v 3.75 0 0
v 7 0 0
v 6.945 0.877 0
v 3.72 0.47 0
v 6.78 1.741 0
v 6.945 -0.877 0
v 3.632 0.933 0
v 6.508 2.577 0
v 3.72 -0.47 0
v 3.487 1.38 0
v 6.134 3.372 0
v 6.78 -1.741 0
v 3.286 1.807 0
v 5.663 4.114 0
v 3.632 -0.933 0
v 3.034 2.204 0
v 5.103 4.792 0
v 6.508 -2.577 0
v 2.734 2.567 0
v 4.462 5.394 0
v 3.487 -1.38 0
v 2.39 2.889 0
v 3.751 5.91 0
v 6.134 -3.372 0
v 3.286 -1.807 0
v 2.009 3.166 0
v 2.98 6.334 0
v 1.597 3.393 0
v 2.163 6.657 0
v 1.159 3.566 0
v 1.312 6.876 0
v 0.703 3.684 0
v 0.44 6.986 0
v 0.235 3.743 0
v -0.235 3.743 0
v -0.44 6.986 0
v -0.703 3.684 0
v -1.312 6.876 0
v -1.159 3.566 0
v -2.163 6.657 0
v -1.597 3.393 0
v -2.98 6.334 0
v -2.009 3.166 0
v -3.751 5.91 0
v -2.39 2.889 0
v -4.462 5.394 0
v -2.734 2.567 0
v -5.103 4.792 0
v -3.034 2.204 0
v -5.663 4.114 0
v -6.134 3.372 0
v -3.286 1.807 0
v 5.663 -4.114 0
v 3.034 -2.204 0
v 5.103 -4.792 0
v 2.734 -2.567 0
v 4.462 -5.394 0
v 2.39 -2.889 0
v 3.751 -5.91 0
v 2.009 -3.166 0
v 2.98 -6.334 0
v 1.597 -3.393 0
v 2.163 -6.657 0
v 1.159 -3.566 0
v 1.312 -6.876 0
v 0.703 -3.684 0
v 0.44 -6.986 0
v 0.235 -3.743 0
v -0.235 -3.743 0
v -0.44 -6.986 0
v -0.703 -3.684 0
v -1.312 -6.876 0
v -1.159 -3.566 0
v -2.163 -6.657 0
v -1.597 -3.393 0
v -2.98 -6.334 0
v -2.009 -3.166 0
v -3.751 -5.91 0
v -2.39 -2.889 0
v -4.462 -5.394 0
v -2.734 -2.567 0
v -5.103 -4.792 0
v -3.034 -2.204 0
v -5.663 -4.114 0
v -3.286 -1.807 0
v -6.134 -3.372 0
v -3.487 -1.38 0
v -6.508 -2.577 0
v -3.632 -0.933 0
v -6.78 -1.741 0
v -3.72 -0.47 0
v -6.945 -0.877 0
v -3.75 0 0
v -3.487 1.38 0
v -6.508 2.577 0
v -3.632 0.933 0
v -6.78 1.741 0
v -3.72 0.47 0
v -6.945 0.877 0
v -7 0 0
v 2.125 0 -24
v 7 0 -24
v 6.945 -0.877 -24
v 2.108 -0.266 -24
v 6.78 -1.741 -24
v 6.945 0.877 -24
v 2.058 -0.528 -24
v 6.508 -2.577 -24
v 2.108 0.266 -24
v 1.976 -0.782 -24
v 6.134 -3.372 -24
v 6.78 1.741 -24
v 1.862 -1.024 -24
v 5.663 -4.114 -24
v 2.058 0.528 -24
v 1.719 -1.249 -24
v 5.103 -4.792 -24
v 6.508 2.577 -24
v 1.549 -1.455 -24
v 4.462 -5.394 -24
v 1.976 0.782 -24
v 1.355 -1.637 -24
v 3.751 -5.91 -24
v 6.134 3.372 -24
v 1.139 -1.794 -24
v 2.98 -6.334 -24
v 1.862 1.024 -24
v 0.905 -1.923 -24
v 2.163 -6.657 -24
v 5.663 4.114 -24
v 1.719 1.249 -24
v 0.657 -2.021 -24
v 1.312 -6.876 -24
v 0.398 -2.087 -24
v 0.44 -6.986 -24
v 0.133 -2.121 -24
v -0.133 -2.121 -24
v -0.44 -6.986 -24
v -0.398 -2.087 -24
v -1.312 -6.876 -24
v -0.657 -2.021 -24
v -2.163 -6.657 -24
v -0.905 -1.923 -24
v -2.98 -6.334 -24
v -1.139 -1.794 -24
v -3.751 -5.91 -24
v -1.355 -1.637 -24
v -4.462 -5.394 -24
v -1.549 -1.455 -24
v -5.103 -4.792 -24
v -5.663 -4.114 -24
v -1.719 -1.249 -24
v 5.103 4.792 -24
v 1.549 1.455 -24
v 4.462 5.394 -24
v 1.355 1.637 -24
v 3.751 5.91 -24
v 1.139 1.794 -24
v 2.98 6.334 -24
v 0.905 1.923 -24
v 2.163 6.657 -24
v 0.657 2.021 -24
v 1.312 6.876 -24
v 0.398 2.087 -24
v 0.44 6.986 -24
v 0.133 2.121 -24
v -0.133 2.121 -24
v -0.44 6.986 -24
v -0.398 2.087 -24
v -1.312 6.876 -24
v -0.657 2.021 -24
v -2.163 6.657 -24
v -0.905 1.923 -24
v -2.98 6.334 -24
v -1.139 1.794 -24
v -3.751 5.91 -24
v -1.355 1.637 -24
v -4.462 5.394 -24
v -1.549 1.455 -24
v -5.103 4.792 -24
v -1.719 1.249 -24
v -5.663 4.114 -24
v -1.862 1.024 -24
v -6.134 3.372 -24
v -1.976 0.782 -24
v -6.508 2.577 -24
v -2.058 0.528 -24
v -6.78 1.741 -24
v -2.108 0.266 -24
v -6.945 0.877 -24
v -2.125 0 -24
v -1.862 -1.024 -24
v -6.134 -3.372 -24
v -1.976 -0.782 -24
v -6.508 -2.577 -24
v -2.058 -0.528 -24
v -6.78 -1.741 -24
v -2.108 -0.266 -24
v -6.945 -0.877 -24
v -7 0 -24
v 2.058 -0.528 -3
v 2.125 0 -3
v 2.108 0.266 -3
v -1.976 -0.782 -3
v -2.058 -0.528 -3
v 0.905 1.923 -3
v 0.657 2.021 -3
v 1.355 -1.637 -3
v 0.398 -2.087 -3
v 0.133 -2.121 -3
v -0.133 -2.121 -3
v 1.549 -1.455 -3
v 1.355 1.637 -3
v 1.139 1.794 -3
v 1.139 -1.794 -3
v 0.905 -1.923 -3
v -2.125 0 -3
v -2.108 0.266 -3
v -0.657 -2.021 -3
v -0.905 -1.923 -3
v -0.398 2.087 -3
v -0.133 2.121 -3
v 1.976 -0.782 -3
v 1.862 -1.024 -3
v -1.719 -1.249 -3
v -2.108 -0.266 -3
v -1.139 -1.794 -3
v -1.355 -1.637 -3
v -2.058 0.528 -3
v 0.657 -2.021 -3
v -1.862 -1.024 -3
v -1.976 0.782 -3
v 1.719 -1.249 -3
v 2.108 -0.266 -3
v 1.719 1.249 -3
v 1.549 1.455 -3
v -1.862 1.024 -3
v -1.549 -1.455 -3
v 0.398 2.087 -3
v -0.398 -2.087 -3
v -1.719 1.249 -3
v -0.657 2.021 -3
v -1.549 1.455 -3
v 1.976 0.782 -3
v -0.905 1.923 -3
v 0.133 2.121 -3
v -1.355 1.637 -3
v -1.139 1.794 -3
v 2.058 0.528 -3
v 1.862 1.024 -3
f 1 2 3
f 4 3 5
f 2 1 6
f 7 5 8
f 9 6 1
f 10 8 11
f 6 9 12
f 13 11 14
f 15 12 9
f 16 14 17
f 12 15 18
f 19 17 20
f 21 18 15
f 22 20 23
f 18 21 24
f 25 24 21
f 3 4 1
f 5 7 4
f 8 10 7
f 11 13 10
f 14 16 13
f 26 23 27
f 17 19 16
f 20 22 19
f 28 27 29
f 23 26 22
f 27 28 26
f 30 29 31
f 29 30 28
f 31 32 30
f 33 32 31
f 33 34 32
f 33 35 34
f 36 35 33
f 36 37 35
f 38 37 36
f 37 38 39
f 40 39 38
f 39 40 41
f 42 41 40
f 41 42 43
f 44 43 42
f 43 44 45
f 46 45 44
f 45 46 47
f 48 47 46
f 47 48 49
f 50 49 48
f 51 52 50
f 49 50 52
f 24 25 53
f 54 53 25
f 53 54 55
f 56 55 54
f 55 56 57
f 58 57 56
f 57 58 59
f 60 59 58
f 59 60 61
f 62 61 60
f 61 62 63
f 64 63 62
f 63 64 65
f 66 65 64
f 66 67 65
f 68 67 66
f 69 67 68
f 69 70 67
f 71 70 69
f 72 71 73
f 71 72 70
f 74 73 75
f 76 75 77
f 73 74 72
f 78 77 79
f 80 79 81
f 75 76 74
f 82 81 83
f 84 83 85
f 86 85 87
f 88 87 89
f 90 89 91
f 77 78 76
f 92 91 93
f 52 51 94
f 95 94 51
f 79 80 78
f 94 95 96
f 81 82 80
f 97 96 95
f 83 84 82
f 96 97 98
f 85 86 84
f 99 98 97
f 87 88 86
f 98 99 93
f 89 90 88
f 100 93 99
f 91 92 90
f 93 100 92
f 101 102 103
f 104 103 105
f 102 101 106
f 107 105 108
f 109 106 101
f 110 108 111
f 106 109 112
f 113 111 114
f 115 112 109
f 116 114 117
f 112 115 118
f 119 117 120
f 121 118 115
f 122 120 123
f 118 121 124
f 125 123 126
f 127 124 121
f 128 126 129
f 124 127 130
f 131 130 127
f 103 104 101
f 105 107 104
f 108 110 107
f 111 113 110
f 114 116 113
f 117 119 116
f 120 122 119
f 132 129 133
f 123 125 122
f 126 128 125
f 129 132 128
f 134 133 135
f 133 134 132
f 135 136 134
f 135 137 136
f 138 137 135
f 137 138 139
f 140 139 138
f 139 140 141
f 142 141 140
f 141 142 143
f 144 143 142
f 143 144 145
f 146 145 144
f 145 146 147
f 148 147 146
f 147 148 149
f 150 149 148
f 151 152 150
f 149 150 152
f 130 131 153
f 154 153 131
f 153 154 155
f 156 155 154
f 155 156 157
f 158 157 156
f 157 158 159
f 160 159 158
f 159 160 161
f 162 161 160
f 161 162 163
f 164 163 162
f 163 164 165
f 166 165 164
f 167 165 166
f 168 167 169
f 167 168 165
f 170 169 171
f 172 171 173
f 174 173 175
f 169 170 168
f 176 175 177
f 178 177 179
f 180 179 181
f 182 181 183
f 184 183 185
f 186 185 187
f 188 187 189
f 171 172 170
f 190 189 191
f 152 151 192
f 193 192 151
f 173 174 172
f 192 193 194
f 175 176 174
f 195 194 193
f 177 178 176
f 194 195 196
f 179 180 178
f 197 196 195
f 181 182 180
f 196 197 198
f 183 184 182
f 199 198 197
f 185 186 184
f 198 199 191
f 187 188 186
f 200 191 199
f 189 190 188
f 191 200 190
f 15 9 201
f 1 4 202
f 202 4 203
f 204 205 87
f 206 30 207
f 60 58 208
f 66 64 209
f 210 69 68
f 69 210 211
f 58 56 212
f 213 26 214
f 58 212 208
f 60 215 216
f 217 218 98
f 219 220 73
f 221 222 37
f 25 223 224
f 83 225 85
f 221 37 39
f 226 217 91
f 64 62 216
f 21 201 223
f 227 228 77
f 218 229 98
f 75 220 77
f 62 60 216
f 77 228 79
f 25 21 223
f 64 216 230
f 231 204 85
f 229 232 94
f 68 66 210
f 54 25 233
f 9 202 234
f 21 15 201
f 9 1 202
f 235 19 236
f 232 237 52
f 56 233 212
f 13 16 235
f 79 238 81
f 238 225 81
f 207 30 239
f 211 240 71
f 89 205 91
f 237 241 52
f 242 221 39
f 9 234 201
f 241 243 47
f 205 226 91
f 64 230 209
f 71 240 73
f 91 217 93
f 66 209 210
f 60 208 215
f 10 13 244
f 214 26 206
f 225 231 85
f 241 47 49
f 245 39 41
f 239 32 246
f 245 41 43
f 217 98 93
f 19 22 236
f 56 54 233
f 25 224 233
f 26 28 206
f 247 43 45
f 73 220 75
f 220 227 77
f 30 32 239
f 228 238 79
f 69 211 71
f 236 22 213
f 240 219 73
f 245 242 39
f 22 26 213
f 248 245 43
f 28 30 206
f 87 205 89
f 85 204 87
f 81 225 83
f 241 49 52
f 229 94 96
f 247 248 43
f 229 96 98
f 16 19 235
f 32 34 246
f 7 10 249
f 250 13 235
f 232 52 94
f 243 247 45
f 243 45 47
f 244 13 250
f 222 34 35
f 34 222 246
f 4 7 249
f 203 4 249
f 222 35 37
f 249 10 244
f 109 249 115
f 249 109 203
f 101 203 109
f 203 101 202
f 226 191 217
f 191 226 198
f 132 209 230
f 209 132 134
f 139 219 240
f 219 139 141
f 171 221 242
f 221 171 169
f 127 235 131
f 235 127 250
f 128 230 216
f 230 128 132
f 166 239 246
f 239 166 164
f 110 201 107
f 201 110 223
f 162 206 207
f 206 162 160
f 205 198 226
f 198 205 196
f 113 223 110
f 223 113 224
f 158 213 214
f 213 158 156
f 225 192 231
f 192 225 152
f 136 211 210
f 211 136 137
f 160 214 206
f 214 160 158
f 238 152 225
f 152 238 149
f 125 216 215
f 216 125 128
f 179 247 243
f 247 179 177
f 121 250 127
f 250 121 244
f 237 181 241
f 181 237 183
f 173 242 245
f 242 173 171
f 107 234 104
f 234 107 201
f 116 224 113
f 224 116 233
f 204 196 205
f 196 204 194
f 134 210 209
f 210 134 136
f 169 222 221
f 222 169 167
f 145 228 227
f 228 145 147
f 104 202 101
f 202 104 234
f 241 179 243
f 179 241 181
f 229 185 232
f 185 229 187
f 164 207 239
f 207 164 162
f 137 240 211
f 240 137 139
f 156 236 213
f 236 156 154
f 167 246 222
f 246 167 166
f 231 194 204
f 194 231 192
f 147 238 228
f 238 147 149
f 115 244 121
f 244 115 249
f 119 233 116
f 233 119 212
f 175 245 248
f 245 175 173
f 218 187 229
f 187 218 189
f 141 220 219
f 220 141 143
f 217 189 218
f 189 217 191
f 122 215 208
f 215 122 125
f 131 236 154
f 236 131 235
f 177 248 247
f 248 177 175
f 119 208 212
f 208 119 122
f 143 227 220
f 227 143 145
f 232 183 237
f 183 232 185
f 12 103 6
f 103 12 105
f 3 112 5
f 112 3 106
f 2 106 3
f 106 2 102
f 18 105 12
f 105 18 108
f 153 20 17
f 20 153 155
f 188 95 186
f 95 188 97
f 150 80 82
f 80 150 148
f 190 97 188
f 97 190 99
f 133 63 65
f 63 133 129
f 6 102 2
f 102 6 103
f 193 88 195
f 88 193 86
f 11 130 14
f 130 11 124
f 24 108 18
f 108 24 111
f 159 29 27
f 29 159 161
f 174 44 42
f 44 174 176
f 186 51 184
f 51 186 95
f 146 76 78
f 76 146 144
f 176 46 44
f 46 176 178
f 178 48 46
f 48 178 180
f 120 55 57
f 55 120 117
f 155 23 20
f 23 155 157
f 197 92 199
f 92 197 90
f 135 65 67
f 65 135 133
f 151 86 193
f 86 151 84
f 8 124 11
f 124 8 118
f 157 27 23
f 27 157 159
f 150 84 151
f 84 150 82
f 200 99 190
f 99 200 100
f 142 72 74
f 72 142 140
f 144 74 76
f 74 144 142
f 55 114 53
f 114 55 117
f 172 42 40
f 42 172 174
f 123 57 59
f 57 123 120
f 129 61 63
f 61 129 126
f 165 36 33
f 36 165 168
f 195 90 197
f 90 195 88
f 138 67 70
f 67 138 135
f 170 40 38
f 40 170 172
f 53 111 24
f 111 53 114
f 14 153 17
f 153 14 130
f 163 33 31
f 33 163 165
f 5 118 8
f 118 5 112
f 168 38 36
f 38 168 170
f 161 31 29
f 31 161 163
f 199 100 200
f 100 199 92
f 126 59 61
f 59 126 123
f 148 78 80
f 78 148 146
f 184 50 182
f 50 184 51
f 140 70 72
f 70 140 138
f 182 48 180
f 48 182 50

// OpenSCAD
$fn = 50;


difference() {
	union() {
		translate(v = [0, 0, -24.0000000000]) {
			cylinder(h = 24, r = 7.0000000000);
		}
		cylinder(h = 0, r = 13.0000000000);
	}
	union() {
		translate(v = [0, 0, 0]) {
			rotate(a = [0, 0, 0]) {
				difference() {
					union() {
						#translate(v = [0, 0, -24.0000000000]) {
							cylinder(h = 24, r = 2.0000000000);
						}
						#translate(v = [0, 0, -3]) {
							cylinder(h = 3, r = 7.0000000000, r1 = 2.1250000000, r2 = 3.7500000000);
						}
						#translate(v = [0, 0, -24.0000000000]) {
							cylinder(h = 24, r = 2.1250000000);
						}
						#translate(v = [0, 0, -24.0000000000]) {
							cylinder(h = 24, r = 2.0000000000);
						}
					}
					union();
				}
			}
		}
	}
}
